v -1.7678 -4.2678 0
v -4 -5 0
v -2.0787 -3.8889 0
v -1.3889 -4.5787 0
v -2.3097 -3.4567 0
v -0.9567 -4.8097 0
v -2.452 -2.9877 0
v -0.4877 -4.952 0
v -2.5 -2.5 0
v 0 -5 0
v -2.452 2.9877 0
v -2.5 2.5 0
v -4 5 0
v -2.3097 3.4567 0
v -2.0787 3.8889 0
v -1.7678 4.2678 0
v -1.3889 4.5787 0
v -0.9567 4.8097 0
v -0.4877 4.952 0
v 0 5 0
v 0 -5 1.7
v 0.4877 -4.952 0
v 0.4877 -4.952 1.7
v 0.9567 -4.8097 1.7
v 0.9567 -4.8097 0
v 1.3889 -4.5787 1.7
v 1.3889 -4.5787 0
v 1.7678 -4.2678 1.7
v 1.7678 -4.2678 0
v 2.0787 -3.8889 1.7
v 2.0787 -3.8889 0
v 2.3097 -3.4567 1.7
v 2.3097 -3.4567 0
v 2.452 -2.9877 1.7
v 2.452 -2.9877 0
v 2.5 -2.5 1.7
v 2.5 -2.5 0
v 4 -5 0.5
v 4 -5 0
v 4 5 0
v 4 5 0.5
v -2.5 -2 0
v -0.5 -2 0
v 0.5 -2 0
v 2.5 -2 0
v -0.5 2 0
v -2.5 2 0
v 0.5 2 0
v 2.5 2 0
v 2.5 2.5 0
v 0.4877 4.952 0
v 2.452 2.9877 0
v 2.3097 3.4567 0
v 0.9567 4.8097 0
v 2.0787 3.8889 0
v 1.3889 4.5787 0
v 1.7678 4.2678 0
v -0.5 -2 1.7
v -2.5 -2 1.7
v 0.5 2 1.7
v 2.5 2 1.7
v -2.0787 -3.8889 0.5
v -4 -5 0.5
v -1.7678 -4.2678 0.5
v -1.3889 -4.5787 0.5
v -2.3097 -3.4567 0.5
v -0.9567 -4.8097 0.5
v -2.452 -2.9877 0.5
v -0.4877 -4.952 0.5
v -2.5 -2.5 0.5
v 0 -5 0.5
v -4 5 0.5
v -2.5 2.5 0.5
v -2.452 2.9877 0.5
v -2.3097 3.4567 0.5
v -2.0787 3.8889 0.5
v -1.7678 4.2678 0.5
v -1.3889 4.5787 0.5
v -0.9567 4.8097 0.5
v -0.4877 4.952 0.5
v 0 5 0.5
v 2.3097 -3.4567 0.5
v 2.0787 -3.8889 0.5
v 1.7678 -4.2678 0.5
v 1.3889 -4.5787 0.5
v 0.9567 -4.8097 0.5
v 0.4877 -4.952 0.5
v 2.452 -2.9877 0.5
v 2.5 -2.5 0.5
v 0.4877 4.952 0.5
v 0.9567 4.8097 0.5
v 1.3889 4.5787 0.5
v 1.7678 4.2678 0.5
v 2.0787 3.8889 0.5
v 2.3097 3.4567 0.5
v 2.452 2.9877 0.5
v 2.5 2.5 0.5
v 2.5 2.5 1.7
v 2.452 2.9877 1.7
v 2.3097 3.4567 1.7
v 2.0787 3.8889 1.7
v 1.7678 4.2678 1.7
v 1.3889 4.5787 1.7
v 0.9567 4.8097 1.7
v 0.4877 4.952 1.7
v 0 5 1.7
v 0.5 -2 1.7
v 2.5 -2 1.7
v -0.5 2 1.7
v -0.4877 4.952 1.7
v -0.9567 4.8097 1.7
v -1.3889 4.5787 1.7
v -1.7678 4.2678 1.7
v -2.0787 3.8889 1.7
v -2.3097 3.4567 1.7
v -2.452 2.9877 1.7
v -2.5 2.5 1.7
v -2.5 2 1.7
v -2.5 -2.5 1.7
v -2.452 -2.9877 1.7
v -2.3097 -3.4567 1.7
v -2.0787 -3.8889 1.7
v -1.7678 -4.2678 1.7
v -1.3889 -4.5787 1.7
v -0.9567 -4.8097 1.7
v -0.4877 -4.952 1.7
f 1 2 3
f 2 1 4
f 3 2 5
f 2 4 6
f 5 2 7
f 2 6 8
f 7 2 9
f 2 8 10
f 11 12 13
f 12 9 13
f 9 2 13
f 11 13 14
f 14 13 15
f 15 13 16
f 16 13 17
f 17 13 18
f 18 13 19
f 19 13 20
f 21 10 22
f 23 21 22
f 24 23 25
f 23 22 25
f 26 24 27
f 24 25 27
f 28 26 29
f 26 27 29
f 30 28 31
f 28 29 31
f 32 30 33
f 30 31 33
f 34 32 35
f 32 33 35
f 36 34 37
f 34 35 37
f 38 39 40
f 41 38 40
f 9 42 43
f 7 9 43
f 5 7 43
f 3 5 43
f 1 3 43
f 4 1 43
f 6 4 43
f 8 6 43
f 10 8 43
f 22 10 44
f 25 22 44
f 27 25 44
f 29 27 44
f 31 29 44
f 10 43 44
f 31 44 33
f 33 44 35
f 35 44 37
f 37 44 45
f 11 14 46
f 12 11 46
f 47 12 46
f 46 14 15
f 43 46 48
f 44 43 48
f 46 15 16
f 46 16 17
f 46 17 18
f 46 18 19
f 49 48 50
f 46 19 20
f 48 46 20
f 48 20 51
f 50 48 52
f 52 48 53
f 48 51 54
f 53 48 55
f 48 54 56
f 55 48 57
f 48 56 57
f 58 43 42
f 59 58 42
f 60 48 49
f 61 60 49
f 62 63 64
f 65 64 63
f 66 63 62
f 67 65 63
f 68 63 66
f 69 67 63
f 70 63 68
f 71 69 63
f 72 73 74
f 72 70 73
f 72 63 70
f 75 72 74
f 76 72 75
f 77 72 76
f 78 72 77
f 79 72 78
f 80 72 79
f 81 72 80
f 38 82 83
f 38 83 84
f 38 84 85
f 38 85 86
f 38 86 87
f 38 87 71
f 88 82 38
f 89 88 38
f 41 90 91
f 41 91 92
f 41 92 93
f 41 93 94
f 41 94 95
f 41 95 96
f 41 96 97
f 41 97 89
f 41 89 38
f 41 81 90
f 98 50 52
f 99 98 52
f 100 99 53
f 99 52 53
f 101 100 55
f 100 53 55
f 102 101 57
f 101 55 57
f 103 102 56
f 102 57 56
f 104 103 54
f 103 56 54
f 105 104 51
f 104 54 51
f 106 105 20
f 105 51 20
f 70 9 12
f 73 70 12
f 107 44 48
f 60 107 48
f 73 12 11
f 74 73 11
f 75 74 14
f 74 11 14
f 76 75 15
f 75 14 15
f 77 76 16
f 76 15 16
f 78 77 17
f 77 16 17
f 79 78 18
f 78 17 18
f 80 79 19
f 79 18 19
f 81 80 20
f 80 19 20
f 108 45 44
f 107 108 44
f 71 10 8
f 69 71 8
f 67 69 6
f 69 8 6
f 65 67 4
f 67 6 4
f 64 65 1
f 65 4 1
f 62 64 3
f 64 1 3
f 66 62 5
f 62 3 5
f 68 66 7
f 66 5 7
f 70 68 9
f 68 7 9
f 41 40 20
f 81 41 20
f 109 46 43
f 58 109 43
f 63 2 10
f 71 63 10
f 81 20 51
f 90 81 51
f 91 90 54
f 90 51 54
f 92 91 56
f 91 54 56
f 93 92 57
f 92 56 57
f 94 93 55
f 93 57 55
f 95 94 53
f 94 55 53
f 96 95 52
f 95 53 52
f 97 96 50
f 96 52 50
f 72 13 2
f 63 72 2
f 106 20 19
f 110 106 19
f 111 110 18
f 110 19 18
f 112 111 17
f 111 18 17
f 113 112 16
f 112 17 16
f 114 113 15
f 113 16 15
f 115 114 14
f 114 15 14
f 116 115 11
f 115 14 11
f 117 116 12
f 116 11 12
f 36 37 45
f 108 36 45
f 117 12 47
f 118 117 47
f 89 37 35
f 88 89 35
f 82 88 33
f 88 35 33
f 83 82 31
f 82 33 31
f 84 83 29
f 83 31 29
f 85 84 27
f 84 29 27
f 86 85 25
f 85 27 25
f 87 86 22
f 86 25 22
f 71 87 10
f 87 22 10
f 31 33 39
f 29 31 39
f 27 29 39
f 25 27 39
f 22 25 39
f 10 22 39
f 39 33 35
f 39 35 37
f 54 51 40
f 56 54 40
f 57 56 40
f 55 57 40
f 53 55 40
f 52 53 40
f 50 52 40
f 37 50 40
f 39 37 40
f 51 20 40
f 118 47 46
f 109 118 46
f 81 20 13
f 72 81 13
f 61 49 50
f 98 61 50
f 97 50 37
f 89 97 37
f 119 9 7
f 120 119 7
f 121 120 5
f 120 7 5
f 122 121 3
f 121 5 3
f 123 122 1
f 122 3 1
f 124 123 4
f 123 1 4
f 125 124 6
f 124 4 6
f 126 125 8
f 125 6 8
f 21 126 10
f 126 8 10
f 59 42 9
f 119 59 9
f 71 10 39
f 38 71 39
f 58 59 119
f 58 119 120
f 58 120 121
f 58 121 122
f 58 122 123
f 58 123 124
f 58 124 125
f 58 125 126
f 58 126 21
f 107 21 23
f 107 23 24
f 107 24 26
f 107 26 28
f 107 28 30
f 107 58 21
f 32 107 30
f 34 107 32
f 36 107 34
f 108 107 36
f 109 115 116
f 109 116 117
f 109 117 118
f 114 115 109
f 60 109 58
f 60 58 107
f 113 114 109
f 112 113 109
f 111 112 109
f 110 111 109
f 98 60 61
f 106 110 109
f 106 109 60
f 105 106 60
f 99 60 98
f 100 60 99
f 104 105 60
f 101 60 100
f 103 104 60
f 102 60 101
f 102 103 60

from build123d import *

# Parameters (mm, degrees)
F1_DEPTH = 0.5
F2_DEPTH = 1.7


with BuildPart() as f1:
    # F0 (on Top) → F1 (new body)
    with BuildSketch(Plane.XY):
        with BuildLine():
            ThreePointArc((-2.5, 2.5), (-1.767767, 4.267767), (0, 5))
            Line((0, 5), (-4, 5))
            Line((-4, 5), (-4, -5))
            Line((-4, -5), (0, -5))
            ThreePointArc((0, -5), (-1.767767, -4.267767), (-2.5, -2.5))
            Line((-2.5, -2.5), (-2.5, -2))
            Line((-2.5, -2), (-2.5, 2))
            Line((-2.5, 2), (-2.5, 2.5))
        make_face()
        with BuildLine():
            ThreePointArc((0, 5), (1.767767, 4.267767), (2.5, 2.5))
            Line((2.5, 2.5), (2.5, 2))
            Line((2.5, 2), (2.5, -2))
            Line((2.5, -2), (2.5, -2.5))
            ThreePointArc((2.5, -2.5), (1.767767, -4.267767), (0, -5))
            Line((0, -5), (4, -5))
            Line((4, -5), (4, 5))
            Line((4, 5), (0, 5))
        make_face()
    extrude(amount=F1_DEPTH)


with BuildPart() as f2:
    # F0 (on Top) → F2 (new body)
    with BuildSketch(Plane.XY):
        with BuildLine():
            Line((2.5, 2), (2.5, 2.5))
            ThreePointArc((2.5, 2.5), (1.767767, 4.267767), (0, 5))
            ThreePointArc((0, 5), (-1.767767, 4.267767), (-2.5, 2.5))
            Line((-2.5, 2.5), (-2.5, 2))
            Line((-2.5, 2), (-0.5, 2))
            Line((-0.5, 2), (-0.5, -2))
            Line((-0.5, -2), (-2.5, -2))
            Line((-2.5, -2), (-2.5, -2.5))
            ThreePointArc((-2.5, -2.5), (-1.767767, -4.267767), (0, -5))
            ThreePointArc((0, -5), (1.767767, -4.267767), (2.5, -2.5))
            Line((2.5, -2.5), (2.5, -2))
            Line((2.5, -2), (0.5, -2))
            Line((0.5, -2), (0.5, 2))
            Line((0.5, 2), (2.5, 2))
        make_face()
    extrude(amount=F2_DEPTH)


solid = Compound([f1.part, f2.part])
